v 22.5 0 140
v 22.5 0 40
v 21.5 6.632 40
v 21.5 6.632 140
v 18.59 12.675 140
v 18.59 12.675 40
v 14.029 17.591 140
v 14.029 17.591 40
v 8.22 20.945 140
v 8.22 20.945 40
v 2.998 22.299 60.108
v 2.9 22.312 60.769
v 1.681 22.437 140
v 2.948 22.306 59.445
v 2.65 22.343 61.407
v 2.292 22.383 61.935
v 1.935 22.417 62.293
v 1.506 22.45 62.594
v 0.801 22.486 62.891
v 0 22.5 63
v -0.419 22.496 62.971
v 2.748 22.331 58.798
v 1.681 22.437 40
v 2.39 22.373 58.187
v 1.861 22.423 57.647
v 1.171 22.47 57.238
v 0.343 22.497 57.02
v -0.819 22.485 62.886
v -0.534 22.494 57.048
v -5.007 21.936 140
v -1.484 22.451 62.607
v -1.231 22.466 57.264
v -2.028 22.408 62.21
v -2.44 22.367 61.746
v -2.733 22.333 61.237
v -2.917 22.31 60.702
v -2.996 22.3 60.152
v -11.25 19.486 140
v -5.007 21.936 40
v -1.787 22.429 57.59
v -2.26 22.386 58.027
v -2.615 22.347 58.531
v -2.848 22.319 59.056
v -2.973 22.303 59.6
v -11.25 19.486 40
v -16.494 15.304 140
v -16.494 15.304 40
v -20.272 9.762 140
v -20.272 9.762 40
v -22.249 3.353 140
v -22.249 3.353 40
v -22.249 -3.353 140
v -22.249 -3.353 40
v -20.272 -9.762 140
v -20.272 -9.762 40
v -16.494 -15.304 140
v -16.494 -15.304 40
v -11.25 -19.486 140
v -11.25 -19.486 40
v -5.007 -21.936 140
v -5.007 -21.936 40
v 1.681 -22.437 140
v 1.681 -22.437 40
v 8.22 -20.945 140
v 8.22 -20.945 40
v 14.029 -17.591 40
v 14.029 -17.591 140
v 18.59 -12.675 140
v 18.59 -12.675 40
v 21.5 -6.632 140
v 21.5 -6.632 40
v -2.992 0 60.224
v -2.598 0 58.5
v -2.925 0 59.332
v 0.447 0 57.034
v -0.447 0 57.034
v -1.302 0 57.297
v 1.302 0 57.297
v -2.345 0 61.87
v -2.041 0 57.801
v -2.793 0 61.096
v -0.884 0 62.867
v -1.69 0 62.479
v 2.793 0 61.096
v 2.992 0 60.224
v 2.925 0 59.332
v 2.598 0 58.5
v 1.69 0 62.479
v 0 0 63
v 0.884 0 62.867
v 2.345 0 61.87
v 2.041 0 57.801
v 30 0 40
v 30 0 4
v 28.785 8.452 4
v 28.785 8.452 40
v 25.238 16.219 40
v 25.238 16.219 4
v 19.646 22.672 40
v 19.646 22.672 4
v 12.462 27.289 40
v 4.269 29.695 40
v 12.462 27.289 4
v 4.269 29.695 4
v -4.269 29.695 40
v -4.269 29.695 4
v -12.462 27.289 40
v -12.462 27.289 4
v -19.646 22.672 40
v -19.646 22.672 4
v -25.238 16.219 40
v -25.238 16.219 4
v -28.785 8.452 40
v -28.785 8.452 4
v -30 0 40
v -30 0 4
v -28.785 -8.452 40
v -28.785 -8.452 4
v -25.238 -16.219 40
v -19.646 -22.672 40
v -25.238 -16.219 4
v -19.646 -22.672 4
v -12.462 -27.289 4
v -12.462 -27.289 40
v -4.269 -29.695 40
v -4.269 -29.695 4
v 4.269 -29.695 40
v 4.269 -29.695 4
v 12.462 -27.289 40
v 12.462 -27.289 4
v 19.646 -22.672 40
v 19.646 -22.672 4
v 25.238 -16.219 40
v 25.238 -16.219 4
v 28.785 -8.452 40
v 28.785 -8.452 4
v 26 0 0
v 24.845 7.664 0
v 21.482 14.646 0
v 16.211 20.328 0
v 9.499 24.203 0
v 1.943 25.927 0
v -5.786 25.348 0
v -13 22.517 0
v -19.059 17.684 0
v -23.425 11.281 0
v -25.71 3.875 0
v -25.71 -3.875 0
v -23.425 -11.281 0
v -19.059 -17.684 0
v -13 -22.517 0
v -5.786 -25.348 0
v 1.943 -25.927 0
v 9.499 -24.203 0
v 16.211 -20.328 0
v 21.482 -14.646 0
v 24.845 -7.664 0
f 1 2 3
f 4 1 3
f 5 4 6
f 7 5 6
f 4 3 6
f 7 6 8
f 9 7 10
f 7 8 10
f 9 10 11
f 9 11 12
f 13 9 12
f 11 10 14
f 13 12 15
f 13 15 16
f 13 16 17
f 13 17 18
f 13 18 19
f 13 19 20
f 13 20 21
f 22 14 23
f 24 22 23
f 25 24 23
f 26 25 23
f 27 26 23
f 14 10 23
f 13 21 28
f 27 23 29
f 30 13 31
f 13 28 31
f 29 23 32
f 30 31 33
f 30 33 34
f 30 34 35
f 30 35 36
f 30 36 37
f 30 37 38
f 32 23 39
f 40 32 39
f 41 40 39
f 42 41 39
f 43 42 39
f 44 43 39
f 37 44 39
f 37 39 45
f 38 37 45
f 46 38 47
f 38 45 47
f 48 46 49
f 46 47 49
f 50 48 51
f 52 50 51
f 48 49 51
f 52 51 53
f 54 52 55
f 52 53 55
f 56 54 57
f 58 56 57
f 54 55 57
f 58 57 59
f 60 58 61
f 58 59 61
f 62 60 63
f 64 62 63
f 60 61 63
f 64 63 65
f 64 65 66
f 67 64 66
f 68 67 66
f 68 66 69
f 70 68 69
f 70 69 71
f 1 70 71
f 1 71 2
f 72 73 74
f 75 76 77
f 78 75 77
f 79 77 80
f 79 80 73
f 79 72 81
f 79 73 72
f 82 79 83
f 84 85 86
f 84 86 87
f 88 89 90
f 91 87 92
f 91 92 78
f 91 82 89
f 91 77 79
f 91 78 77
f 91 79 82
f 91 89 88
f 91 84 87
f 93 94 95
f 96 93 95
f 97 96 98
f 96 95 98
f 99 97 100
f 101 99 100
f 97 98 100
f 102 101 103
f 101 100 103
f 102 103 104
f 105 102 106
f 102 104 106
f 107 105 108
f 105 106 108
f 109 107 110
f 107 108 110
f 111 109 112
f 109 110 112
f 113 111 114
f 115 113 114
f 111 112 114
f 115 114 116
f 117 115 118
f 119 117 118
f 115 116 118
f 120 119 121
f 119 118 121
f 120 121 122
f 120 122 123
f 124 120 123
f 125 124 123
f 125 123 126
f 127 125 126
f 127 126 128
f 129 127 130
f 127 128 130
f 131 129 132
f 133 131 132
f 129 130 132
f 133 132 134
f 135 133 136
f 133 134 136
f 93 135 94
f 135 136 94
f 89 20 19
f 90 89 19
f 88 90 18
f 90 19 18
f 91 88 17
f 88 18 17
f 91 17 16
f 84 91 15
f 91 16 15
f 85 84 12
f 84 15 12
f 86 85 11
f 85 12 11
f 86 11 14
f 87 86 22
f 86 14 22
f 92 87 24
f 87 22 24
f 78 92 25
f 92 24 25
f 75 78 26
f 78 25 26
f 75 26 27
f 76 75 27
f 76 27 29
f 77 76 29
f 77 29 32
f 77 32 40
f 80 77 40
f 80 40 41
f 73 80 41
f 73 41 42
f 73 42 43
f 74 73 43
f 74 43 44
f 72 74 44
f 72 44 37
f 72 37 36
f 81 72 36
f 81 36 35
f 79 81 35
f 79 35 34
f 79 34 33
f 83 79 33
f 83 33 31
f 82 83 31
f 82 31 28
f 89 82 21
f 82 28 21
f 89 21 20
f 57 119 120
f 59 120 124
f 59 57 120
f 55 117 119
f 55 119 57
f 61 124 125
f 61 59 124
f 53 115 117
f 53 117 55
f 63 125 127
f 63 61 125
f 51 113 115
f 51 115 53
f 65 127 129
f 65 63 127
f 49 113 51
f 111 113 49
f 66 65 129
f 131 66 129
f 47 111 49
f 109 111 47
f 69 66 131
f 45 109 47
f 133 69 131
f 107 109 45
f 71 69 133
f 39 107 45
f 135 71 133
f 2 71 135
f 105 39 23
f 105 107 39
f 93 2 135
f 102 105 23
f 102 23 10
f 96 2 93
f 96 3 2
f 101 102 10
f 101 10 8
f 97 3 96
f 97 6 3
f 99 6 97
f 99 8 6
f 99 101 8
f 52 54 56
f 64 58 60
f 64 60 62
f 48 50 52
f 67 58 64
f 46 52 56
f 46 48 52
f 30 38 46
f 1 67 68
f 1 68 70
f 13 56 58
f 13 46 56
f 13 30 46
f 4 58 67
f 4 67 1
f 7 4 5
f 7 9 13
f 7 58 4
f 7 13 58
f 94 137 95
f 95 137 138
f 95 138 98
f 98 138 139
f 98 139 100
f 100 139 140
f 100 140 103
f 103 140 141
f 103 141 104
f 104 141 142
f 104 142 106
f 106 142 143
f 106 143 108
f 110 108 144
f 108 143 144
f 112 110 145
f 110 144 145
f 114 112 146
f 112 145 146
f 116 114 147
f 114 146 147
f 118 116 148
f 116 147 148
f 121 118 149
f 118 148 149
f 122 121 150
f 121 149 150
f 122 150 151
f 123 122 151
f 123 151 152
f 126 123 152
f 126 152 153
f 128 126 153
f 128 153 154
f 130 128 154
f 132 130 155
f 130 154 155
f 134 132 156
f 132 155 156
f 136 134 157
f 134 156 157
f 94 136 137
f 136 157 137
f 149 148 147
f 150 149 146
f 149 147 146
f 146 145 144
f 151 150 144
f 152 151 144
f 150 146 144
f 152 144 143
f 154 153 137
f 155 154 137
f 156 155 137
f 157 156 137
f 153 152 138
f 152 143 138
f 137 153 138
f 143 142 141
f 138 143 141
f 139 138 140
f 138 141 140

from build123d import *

# Parameters (mm, degrees)
ESQUISSE1_R             = 30
BASE_EXTRUSION_DEPTH    = 40
ESQUISSE2_R             = 22.5
BOSS_EXTRU_1_DEPTH      = 100
ESQUISSE3_R             = 3
ENL_V_MAT_EXTRU_1_DEPTH = 30
CHANFREIN1_SIZE         = 4


with BuildPart() as part:
    # Esquisse1 → Base-Extrusion (new body)
    with BuildSketch(Plane.XY):
        Circle(ESQUISSE1_R)
    extrude(amount=BASE_EXTRUSION_DEPTH)

    # Esquisse2 → Boss.-Extru.1 (add)
    with BuildSketch(Plane.XY.offset(40)):
        Circle(ESQUISSE2_R)
    extrude(amount=BOSS_EXTRU_1_DEPTH)

    # Esquisse3 → Enlèv. mat.-Extru.1 (cut)
    with BuildSketch(Plane(origin=(0, 30, 0), x_dir=(-1, 0, 0), z_dir=(0, 1, 0))):
        with Locations(Location((0, 60, 0), (0, 0, 90))):
            Circle(ESQUISSE3_R)
    extrude(amount=-ENL_V_MAT_EXTRU_1_DEPTH, mode=Mode.SUBTRACT)

    # Chanfrein1
    chanfrein1_edges = [part.edges().sort_by_distance(p)[0] for p in [
        (-30, 0, 0),
    ]]
    chamfer(chanfrein1_edges, length=CHANFREIN1_SIZE)


solid = part.part
